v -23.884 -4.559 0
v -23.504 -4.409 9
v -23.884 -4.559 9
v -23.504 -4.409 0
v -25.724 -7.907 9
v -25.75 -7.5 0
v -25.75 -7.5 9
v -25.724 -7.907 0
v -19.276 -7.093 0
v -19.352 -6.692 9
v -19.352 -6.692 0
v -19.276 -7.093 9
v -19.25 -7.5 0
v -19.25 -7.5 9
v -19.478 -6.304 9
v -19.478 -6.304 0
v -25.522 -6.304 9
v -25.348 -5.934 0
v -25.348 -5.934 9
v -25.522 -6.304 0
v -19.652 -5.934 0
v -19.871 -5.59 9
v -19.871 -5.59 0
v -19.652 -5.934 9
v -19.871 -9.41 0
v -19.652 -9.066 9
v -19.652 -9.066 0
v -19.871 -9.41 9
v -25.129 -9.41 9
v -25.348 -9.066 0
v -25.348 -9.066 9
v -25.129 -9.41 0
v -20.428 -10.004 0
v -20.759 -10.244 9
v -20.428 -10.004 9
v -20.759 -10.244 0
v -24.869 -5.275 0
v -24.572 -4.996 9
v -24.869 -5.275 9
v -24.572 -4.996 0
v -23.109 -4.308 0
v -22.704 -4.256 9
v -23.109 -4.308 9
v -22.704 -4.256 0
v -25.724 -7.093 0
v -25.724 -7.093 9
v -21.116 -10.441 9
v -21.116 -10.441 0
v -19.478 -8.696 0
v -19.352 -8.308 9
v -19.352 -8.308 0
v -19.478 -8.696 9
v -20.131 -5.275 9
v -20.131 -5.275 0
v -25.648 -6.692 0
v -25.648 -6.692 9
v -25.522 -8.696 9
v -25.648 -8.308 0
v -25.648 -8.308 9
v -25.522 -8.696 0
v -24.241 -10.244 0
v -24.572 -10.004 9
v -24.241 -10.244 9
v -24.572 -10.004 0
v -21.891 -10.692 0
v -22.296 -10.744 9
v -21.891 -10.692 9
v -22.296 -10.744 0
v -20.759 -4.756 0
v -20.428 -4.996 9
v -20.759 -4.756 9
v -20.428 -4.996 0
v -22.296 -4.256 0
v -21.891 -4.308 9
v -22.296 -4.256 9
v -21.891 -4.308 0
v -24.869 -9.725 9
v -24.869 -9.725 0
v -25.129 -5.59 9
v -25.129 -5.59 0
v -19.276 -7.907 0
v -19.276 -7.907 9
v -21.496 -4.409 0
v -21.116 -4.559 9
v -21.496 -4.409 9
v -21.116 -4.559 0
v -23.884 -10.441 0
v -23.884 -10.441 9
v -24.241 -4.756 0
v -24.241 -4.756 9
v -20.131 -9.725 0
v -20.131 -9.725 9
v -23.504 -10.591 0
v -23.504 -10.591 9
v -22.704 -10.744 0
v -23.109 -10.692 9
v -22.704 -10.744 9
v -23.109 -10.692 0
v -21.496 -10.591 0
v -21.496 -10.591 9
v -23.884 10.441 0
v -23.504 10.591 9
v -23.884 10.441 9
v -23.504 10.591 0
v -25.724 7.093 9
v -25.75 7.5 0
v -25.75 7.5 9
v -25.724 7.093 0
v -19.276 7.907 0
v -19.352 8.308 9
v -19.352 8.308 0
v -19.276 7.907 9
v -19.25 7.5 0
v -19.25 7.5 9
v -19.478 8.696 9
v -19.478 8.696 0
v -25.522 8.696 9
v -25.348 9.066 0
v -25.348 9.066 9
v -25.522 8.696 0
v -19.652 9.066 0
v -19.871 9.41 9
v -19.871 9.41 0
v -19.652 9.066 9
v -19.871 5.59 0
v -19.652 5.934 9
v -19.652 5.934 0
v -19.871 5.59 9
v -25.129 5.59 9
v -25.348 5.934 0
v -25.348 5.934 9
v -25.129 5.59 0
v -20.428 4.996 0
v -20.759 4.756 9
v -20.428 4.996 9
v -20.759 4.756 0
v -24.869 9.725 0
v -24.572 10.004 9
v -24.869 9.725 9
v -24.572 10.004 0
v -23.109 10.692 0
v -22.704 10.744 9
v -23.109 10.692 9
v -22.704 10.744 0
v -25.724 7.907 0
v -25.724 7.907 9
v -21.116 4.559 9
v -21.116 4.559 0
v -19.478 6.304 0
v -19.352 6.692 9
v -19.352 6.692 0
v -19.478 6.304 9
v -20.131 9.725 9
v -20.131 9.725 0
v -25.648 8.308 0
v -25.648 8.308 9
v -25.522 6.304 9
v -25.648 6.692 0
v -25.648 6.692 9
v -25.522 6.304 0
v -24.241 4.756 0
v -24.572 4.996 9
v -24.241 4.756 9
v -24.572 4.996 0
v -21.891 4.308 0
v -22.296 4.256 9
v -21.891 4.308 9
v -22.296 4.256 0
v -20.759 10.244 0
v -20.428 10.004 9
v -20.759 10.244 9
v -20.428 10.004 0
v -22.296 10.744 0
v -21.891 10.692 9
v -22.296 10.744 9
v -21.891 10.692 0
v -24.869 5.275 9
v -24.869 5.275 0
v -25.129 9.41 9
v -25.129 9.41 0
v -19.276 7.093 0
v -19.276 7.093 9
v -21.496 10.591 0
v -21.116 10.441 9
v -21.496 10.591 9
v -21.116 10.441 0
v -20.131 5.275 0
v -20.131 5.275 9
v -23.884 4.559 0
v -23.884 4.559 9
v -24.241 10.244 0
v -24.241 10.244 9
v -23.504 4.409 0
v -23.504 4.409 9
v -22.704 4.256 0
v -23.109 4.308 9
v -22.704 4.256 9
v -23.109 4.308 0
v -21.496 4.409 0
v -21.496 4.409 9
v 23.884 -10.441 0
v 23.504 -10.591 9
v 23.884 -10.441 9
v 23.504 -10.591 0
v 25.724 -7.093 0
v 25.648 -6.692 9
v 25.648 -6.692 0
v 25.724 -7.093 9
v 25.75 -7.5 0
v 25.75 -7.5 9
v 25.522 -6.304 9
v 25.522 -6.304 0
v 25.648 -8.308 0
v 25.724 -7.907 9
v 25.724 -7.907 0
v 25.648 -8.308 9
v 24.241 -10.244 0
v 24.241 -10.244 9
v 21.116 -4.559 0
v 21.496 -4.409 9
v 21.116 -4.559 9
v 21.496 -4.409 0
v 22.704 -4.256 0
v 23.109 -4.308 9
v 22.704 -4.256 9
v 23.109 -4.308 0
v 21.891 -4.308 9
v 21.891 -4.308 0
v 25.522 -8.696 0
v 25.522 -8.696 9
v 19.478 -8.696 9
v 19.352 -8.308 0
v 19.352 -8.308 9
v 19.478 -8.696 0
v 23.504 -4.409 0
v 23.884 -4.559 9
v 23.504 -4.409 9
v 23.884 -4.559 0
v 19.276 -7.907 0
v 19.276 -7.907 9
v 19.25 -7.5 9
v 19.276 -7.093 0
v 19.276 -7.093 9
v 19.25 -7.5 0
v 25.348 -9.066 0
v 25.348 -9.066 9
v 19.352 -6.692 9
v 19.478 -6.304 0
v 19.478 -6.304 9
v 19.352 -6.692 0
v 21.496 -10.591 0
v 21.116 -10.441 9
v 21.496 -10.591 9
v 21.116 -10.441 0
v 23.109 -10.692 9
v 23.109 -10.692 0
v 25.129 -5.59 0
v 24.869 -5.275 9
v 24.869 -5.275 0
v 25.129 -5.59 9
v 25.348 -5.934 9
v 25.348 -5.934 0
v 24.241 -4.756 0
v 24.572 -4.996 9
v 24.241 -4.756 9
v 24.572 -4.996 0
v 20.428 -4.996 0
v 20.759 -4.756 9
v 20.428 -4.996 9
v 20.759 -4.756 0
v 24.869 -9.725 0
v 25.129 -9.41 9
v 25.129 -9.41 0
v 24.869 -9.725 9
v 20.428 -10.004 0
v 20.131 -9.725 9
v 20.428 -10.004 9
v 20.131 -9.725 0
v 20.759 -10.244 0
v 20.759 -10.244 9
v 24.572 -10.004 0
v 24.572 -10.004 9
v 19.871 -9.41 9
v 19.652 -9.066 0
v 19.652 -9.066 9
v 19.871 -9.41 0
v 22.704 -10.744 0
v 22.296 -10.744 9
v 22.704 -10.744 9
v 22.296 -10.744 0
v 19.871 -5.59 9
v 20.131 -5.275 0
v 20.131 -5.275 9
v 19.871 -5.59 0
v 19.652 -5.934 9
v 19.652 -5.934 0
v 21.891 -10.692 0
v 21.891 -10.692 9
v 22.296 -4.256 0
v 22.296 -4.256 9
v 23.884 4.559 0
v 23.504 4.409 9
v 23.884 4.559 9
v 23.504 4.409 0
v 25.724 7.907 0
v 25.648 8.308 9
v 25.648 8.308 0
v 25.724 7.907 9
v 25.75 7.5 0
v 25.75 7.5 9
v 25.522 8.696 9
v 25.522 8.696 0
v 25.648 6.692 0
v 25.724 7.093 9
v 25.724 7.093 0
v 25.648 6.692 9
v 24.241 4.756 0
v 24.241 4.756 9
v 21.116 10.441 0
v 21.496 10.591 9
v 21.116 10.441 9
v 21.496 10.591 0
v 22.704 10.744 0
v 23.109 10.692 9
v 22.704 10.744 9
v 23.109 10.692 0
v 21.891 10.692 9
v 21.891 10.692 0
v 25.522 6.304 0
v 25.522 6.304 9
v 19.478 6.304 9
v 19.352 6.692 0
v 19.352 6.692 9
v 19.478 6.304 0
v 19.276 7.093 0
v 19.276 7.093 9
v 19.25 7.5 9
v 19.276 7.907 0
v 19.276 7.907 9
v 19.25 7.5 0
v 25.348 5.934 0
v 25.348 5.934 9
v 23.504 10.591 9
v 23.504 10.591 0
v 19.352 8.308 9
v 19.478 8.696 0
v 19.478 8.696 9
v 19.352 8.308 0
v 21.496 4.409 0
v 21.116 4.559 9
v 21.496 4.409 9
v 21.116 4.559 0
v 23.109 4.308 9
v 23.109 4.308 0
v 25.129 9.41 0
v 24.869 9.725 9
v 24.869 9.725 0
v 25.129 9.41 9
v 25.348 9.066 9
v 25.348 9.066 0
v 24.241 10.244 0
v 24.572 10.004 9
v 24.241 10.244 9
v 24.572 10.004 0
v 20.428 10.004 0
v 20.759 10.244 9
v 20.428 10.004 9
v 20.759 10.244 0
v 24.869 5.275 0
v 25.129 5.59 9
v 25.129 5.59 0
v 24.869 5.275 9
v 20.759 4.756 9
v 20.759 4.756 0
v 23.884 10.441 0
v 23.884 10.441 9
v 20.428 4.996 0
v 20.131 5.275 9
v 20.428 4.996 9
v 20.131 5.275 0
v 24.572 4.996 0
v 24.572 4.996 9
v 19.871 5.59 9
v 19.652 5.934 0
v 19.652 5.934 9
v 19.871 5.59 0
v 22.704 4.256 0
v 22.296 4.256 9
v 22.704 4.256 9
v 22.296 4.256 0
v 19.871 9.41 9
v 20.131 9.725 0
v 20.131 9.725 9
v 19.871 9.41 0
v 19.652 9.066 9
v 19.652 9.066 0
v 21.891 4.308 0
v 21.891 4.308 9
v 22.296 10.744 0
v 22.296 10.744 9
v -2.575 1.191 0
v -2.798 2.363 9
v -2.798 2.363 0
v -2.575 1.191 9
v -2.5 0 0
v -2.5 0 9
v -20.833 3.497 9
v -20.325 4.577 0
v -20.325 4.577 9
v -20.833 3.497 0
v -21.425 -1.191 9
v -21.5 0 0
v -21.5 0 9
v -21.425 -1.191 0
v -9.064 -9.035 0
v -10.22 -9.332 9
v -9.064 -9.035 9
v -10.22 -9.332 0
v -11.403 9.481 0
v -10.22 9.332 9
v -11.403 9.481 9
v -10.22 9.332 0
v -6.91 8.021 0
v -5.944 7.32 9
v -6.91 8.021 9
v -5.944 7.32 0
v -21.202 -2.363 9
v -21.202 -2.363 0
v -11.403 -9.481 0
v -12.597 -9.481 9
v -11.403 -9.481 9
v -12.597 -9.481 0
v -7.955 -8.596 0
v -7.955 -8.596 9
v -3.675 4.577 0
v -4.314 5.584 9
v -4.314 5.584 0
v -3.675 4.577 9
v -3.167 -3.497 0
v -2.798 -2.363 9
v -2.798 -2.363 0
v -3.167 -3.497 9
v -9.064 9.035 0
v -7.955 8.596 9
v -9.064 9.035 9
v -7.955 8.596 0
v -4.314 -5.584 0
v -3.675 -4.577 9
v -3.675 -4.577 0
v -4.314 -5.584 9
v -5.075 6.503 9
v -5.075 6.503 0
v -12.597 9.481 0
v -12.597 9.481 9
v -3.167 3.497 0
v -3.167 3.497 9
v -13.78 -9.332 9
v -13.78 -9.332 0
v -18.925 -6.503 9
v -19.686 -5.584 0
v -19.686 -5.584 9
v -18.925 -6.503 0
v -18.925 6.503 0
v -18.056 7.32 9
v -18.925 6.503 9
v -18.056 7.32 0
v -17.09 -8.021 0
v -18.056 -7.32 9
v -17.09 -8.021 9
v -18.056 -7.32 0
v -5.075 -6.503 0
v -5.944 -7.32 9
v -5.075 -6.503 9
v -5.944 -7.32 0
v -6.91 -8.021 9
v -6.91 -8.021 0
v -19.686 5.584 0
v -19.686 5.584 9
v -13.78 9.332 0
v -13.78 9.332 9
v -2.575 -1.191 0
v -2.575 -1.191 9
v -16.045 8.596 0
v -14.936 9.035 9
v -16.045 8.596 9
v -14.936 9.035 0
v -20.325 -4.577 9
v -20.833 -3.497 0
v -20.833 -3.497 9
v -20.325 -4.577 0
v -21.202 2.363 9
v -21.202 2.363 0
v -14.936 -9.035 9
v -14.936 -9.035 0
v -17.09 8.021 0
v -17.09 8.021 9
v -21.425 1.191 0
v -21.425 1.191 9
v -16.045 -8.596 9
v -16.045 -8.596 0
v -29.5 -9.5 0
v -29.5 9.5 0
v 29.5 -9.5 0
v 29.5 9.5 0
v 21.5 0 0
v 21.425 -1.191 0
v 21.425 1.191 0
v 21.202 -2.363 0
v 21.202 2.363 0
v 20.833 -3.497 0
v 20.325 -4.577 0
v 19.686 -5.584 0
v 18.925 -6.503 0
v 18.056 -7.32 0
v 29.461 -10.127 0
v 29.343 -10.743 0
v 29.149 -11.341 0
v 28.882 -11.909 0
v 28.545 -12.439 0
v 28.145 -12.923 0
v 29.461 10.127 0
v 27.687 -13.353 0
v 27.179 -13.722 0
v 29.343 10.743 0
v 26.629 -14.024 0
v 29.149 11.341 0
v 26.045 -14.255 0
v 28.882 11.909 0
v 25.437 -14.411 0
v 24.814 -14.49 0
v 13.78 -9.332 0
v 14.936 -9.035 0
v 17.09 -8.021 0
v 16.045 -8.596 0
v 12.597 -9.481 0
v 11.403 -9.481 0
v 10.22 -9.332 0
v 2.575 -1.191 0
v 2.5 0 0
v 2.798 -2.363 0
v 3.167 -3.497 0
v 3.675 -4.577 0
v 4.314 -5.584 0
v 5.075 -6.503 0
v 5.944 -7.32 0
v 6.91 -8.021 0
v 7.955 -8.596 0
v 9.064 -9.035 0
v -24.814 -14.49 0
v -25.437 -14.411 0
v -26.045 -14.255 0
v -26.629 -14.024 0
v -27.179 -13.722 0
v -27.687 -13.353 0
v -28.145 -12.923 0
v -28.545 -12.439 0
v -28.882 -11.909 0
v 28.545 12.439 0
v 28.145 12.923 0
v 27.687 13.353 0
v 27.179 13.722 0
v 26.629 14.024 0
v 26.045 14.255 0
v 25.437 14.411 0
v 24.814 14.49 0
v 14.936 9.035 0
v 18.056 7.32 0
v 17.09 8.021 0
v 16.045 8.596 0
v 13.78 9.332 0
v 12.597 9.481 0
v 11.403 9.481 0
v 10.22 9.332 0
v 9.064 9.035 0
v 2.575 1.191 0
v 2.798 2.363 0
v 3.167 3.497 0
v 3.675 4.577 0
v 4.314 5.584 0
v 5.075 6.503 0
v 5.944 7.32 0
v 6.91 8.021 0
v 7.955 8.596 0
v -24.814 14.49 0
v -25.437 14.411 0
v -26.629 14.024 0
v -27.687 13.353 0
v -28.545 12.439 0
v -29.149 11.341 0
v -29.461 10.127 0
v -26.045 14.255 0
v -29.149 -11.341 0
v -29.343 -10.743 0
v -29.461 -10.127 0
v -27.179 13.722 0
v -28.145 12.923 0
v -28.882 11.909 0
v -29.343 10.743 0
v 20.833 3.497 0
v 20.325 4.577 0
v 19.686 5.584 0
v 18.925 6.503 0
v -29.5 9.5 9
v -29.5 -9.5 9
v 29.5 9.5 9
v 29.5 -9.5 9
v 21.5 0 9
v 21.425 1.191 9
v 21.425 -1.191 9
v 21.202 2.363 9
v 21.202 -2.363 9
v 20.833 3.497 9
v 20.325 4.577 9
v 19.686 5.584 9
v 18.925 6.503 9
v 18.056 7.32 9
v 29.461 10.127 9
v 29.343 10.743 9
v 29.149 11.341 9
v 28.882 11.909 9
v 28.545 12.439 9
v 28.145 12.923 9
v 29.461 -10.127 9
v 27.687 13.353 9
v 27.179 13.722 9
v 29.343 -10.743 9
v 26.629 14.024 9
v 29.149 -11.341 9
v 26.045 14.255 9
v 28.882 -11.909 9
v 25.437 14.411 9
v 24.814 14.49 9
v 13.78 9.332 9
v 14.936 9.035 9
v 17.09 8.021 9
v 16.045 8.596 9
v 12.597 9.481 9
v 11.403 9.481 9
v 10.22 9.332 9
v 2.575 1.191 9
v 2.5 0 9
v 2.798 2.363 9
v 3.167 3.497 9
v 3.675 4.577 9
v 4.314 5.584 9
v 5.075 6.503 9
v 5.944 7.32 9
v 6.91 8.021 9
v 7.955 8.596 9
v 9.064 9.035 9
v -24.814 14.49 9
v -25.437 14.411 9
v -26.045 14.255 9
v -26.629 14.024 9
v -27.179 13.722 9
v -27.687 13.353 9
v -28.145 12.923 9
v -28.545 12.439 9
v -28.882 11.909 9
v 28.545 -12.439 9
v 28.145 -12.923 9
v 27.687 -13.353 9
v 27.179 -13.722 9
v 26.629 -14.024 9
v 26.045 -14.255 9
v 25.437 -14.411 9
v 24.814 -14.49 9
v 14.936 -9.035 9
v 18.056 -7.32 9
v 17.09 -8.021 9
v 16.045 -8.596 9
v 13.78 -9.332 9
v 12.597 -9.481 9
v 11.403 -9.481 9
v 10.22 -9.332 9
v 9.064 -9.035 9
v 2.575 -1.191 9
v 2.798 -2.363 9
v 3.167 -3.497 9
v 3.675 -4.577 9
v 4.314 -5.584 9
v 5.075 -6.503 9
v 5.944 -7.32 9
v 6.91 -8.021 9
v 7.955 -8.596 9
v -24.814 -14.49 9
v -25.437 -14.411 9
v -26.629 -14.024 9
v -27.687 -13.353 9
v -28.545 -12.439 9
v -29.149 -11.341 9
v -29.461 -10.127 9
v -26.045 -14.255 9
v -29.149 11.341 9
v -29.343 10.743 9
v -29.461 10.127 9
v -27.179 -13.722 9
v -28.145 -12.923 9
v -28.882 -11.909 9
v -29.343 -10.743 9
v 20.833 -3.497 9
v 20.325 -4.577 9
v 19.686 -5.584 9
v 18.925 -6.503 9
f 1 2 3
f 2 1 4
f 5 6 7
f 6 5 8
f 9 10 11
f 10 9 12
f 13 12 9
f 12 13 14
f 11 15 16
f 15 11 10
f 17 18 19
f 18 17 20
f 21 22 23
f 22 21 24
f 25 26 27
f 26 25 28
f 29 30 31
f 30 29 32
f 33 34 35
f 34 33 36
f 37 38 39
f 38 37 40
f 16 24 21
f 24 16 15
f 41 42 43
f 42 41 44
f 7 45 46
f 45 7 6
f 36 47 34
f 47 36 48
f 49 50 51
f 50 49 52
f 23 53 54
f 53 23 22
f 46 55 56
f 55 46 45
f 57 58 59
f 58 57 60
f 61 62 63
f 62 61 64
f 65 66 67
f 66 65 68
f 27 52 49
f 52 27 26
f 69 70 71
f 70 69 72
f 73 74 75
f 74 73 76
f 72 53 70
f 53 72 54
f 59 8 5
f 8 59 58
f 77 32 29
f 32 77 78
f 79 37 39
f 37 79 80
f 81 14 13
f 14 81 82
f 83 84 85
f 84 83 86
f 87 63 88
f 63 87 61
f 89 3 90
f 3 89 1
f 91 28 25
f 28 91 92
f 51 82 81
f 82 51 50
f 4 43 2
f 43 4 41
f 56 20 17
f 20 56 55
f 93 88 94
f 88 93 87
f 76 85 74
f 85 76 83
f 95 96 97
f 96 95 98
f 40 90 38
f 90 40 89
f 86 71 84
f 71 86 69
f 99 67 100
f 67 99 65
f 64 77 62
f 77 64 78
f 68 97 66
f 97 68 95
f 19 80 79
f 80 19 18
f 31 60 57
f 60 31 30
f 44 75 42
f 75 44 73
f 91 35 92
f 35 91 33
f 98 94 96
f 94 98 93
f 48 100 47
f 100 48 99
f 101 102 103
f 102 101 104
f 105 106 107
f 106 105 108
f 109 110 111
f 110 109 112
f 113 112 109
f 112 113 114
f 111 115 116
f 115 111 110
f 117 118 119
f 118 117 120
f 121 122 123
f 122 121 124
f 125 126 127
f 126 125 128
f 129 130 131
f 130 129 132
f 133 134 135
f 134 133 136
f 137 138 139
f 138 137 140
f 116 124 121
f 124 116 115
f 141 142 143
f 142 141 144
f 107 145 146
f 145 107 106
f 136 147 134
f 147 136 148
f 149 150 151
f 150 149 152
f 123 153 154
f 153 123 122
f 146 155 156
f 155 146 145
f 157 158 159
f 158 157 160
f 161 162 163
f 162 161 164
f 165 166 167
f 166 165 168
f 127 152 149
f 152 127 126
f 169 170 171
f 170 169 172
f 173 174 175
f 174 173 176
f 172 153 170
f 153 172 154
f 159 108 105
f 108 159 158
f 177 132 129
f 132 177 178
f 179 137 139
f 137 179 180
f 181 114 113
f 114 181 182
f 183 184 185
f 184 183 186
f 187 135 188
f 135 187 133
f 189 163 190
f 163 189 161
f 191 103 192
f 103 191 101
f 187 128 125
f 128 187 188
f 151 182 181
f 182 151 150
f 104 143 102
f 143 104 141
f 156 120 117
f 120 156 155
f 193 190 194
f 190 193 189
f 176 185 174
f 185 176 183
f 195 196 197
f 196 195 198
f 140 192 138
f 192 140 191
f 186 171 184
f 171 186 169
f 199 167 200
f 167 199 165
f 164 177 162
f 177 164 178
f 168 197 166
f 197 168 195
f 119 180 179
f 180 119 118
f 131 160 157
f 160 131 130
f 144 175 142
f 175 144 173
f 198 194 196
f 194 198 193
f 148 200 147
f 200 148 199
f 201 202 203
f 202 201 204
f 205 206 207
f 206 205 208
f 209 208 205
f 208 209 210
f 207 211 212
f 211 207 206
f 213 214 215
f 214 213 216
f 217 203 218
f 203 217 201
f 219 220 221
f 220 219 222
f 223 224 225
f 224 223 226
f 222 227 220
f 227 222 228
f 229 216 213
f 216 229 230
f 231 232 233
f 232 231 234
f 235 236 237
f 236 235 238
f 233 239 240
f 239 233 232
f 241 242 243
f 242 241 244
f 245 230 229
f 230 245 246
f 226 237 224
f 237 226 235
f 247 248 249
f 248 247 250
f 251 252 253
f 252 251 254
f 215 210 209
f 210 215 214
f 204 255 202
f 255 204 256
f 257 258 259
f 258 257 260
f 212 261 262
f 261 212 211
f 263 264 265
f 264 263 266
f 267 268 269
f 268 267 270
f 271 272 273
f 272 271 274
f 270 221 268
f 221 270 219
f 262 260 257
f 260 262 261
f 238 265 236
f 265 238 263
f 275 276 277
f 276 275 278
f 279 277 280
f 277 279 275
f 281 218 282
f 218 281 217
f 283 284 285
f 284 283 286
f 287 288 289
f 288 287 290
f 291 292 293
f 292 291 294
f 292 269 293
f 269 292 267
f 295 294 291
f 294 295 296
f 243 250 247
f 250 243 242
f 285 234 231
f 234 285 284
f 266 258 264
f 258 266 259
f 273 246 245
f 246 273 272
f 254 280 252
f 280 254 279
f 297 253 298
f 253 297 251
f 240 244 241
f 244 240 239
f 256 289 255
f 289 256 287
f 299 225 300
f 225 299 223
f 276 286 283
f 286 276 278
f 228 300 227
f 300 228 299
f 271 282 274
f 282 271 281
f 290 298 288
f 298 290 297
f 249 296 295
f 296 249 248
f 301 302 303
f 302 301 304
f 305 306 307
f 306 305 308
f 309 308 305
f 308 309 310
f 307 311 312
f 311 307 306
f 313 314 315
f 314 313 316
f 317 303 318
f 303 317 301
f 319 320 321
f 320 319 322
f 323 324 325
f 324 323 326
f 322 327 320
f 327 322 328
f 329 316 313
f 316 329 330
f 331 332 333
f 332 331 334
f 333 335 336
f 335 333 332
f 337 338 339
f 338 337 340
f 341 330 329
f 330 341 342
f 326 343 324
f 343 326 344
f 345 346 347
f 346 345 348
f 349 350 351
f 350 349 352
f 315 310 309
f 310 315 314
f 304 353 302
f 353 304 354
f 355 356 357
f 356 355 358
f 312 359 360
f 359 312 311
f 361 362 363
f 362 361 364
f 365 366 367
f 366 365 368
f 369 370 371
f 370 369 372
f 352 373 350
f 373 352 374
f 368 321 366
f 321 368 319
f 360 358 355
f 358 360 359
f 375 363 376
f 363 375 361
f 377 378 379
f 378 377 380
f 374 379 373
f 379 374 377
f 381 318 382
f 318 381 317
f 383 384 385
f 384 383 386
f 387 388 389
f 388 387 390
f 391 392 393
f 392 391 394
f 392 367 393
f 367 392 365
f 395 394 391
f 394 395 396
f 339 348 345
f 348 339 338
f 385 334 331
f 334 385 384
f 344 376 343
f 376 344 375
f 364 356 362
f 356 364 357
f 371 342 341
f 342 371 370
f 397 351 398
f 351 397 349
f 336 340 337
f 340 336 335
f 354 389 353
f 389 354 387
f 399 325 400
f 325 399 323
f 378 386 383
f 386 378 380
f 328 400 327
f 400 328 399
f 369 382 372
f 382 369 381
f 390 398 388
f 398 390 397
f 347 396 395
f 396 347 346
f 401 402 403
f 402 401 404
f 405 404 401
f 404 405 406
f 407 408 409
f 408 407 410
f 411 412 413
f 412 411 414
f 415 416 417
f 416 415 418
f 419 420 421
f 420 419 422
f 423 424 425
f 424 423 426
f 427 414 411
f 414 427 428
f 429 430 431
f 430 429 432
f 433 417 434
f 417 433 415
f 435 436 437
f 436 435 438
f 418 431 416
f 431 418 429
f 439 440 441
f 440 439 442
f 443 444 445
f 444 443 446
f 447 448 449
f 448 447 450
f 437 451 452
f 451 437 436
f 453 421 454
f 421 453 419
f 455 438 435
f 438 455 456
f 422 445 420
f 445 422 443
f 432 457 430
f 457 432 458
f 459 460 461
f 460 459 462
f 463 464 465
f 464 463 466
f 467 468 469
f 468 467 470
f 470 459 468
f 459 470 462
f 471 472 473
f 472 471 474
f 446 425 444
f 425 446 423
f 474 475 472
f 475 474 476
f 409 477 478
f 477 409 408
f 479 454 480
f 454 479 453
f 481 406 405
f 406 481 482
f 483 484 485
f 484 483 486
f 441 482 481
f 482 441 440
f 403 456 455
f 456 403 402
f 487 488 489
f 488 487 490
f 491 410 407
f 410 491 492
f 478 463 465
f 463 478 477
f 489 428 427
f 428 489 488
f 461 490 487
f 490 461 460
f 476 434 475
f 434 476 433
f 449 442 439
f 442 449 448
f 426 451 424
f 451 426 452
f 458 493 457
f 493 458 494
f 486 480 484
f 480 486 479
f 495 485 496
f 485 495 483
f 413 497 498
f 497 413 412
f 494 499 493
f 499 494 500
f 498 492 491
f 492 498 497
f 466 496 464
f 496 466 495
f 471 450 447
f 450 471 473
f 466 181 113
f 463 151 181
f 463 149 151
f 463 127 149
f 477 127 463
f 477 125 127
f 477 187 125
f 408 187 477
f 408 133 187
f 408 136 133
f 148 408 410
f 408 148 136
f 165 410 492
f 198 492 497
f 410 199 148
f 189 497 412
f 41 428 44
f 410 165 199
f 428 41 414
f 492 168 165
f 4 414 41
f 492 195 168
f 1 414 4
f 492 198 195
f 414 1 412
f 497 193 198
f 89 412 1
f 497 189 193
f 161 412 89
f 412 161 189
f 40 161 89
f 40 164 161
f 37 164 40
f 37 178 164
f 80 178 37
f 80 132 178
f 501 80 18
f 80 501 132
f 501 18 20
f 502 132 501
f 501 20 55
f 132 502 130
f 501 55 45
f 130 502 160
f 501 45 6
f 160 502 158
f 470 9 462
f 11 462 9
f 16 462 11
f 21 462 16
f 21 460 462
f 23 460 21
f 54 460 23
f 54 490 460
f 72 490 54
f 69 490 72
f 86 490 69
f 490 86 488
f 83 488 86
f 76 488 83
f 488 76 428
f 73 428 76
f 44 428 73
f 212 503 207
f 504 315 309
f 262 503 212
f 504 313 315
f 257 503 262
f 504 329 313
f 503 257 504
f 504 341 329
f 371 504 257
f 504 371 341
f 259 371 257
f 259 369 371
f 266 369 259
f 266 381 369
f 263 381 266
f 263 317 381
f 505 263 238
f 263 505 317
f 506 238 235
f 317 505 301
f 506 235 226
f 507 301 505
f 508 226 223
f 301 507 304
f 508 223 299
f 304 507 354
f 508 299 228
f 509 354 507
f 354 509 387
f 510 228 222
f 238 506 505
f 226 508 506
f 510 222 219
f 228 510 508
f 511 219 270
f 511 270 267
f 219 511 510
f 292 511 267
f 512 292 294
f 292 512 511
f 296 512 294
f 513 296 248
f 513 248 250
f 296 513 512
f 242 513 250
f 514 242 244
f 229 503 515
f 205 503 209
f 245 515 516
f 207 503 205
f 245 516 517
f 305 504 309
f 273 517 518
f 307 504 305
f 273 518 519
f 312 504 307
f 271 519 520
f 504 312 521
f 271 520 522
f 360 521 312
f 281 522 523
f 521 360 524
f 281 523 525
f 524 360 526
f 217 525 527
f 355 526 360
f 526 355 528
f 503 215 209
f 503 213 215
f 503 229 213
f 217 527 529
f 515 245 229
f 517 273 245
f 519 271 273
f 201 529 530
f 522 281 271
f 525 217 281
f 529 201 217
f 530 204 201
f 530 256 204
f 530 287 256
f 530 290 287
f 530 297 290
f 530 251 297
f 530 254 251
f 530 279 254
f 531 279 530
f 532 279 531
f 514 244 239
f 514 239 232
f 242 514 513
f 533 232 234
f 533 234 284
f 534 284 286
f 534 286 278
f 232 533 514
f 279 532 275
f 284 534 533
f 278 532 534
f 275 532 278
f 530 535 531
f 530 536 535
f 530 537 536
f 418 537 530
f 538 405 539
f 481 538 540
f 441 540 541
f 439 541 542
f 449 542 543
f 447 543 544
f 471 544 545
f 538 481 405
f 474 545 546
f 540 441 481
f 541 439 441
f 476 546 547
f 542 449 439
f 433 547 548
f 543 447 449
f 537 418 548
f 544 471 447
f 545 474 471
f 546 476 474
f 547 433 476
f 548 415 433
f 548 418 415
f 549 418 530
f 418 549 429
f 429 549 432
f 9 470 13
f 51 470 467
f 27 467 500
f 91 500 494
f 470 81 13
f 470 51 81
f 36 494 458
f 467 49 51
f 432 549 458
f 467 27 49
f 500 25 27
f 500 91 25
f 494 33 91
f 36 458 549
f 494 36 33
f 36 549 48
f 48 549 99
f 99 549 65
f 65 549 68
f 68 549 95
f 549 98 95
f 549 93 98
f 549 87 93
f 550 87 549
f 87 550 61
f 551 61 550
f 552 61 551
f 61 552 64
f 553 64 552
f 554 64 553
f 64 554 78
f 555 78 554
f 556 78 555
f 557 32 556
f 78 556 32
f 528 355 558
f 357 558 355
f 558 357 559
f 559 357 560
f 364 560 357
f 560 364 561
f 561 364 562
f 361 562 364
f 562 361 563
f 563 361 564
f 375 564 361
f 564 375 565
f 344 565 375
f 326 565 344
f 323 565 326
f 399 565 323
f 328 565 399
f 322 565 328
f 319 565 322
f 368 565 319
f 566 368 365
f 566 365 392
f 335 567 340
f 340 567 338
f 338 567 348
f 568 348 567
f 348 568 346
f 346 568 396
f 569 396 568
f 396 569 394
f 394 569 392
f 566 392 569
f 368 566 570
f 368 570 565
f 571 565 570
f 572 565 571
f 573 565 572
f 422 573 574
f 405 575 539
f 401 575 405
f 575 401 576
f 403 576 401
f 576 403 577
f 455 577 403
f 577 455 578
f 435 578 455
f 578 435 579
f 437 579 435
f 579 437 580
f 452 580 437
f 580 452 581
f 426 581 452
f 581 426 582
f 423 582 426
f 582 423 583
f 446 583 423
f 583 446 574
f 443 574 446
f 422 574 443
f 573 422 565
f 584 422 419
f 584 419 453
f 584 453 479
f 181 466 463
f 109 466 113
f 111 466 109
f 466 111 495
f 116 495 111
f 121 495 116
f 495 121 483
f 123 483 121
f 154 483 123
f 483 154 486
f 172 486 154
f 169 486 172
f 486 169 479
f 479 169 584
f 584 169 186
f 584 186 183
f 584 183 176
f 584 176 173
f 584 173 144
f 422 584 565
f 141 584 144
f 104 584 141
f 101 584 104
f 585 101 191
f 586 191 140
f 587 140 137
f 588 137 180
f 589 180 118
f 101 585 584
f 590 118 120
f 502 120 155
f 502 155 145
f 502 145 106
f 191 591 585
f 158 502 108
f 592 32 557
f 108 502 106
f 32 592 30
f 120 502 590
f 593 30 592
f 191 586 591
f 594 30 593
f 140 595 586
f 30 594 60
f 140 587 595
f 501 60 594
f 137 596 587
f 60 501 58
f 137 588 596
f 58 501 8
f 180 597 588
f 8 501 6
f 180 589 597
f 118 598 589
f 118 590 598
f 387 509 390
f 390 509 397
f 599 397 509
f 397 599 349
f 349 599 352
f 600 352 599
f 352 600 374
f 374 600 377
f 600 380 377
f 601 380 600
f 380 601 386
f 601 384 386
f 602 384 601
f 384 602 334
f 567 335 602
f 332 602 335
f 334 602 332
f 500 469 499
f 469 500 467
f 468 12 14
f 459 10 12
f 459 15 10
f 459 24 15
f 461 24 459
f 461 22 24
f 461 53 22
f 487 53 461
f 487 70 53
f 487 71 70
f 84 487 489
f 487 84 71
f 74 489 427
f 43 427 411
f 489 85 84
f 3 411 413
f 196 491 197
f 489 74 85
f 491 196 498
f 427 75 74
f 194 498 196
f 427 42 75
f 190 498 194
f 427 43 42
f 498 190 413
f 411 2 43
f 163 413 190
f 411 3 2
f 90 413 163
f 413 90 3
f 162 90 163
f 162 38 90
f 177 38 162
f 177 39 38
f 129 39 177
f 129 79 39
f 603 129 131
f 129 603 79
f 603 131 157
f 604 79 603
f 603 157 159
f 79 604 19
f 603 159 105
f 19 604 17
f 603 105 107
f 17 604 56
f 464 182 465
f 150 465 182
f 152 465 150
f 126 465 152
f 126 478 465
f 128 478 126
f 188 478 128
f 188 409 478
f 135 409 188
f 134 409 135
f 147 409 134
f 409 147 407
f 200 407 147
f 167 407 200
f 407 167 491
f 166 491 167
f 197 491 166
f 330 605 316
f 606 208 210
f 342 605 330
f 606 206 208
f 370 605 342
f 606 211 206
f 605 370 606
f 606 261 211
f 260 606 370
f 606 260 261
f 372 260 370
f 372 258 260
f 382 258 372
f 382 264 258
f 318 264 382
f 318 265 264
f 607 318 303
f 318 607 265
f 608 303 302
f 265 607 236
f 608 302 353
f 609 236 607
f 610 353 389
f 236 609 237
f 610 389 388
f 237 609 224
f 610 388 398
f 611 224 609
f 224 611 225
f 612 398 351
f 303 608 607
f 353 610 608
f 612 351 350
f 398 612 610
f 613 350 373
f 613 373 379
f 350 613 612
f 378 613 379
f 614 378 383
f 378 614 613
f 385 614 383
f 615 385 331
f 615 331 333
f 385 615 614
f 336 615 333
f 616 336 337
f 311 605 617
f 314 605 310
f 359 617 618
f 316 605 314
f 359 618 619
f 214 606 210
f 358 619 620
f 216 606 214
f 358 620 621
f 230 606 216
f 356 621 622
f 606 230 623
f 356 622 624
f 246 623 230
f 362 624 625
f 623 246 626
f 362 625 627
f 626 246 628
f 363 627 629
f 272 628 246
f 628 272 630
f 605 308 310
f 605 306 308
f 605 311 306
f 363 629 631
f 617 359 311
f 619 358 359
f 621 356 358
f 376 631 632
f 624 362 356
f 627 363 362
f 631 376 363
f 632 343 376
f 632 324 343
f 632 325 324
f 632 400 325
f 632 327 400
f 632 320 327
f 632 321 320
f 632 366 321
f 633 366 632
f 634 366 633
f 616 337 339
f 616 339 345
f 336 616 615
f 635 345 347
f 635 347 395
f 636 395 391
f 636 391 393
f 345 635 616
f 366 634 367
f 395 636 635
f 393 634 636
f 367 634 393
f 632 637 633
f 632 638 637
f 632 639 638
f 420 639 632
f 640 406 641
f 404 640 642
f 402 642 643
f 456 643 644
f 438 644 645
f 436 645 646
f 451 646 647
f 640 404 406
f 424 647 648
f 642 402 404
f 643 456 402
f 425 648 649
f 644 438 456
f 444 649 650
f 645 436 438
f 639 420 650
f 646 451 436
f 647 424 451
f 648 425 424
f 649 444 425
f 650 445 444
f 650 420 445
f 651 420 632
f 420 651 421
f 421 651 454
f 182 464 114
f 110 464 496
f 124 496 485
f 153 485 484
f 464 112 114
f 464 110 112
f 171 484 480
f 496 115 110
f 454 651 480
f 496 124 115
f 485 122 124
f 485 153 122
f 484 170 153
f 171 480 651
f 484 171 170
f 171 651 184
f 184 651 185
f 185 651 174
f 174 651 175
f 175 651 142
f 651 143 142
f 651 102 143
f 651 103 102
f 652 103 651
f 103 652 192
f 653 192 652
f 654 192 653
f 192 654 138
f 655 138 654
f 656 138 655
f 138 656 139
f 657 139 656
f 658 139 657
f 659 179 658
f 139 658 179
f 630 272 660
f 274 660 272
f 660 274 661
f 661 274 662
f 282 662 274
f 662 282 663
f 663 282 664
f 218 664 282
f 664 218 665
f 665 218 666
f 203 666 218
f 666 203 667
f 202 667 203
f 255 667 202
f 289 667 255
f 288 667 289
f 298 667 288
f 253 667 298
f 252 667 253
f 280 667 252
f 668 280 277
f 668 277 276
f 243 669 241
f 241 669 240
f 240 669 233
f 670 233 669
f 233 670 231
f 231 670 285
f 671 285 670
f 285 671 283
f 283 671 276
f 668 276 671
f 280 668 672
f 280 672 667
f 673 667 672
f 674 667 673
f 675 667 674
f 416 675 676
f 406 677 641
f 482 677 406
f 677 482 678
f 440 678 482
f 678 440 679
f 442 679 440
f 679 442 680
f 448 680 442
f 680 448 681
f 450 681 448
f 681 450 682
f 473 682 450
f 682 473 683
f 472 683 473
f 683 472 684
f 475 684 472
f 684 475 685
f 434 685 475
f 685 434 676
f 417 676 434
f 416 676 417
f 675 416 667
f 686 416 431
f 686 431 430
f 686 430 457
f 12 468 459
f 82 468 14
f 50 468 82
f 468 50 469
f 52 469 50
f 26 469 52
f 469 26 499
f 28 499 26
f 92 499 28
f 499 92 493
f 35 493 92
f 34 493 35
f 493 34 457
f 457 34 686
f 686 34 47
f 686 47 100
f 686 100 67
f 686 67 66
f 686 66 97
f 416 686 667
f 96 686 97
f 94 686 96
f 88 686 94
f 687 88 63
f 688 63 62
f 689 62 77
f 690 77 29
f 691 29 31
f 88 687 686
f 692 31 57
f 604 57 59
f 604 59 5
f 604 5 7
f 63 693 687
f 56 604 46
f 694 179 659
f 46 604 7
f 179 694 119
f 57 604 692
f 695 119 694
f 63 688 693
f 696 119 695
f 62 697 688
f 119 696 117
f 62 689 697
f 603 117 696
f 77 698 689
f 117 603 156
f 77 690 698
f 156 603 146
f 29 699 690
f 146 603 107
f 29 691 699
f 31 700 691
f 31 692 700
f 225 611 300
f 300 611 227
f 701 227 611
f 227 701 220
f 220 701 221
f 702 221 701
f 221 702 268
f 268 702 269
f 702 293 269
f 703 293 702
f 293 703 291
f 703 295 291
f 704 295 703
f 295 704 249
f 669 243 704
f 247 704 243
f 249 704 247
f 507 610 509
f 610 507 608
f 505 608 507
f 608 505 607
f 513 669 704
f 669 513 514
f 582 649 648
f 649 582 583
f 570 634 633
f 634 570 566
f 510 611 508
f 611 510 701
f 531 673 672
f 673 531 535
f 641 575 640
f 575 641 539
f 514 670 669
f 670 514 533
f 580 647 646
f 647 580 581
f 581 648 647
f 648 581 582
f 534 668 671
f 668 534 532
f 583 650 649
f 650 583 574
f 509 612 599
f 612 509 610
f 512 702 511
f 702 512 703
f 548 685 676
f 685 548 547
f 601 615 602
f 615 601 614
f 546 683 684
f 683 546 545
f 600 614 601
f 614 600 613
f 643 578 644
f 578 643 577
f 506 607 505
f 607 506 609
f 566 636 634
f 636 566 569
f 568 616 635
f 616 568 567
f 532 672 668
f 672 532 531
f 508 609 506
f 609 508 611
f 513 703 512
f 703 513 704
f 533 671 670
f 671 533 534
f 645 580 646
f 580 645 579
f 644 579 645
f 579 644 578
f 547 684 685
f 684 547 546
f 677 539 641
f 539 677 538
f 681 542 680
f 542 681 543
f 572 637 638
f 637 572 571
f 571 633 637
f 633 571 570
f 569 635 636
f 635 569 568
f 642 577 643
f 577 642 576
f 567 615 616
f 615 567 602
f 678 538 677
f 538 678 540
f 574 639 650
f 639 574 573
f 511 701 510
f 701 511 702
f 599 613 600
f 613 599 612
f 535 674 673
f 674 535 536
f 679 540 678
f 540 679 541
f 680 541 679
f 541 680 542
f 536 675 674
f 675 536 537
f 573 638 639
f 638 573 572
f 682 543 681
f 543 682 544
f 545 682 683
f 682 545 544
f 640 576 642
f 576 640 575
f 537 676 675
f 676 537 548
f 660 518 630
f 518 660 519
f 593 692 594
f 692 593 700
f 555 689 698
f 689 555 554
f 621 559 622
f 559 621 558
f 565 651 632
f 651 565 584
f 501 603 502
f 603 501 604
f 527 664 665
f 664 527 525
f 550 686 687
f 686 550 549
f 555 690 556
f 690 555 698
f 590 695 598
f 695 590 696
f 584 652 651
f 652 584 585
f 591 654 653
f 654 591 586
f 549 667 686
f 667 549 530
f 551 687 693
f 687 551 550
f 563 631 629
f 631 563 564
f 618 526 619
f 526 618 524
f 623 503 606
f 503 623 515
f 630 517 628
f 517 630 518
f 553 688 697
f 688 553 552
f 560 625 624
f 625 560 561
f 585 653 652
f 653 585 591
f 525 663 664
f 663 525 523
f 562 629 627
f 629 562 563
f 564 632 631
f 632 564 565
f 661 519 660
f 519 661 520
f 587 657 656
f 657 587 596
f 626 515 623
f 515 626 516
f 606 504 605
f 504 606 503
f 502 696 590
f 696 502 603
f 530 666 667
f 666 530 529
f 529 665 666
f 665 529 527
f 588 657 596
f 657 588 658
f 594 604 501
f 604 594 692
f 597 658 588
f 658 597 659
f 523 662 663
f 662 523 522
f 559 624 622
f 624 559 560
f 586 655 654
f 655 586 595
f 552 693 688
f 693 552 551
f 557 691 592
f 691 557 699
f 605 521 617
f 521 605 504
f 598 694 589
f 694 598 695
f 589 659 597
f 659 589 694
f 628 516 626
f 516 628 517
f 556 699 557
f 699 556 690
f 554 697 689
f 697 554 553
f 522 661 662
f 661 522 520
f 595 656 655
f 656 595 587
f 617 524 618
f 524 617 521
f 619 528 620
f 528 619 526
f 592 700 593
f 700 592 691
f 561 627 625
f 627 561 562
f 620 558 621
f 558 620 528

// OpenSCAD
$fn = 50;


difference() {
	union() {
		hull() {
			translate(v = [-24.5000000000, 9.5000000000, 0]) {
				cylinder(h = 9, r = 5);
			}
			translate(v = [24.5000000000, 9.5000000000, 0]) {
				cylinder(h = 9, r = 5);
			}
			translate(v = [-24.5000000000, -9.5000000000, 0]) {
				cylinder(h = 9, r = 5);
			}
			translate(v = [24.5000000000, -9.5000000000, 0]) {
				cylinder(h = 9, r = 5);
			}
		}
	}
	union() {
		#translate(v = [-22.5000000000, -7.5000000000, -100.0000000000]) {
			cylinder(h = 200, r = 3.2500000000);
		}
		#translate(v = [-22.5000000000, 7.5000000000, -100.0000000000]) {
			cylinder(h = 200, r = 3.2500000000);
		}
		#translate(v = [22.5000000000, -7.5000000000, -100.0000000000]) {
			cylinder(h = 200, r = 3.2500000000);
		}
		#translate(v = [22.5000000000, 7.5000000000, -100.0000000000]) {
			cylinder(h = 200, r = 3.2500000000);
		}
		#translate(v = [-12.0000000000, 0, 0]) {
			cylinder(h = 9, r = 9.5000000000);
		}
		#translate(v = [12.0000000000, 0, 0]) {
			cylinder(h = 9, r = 9.5000000000);
		}
	}
}
